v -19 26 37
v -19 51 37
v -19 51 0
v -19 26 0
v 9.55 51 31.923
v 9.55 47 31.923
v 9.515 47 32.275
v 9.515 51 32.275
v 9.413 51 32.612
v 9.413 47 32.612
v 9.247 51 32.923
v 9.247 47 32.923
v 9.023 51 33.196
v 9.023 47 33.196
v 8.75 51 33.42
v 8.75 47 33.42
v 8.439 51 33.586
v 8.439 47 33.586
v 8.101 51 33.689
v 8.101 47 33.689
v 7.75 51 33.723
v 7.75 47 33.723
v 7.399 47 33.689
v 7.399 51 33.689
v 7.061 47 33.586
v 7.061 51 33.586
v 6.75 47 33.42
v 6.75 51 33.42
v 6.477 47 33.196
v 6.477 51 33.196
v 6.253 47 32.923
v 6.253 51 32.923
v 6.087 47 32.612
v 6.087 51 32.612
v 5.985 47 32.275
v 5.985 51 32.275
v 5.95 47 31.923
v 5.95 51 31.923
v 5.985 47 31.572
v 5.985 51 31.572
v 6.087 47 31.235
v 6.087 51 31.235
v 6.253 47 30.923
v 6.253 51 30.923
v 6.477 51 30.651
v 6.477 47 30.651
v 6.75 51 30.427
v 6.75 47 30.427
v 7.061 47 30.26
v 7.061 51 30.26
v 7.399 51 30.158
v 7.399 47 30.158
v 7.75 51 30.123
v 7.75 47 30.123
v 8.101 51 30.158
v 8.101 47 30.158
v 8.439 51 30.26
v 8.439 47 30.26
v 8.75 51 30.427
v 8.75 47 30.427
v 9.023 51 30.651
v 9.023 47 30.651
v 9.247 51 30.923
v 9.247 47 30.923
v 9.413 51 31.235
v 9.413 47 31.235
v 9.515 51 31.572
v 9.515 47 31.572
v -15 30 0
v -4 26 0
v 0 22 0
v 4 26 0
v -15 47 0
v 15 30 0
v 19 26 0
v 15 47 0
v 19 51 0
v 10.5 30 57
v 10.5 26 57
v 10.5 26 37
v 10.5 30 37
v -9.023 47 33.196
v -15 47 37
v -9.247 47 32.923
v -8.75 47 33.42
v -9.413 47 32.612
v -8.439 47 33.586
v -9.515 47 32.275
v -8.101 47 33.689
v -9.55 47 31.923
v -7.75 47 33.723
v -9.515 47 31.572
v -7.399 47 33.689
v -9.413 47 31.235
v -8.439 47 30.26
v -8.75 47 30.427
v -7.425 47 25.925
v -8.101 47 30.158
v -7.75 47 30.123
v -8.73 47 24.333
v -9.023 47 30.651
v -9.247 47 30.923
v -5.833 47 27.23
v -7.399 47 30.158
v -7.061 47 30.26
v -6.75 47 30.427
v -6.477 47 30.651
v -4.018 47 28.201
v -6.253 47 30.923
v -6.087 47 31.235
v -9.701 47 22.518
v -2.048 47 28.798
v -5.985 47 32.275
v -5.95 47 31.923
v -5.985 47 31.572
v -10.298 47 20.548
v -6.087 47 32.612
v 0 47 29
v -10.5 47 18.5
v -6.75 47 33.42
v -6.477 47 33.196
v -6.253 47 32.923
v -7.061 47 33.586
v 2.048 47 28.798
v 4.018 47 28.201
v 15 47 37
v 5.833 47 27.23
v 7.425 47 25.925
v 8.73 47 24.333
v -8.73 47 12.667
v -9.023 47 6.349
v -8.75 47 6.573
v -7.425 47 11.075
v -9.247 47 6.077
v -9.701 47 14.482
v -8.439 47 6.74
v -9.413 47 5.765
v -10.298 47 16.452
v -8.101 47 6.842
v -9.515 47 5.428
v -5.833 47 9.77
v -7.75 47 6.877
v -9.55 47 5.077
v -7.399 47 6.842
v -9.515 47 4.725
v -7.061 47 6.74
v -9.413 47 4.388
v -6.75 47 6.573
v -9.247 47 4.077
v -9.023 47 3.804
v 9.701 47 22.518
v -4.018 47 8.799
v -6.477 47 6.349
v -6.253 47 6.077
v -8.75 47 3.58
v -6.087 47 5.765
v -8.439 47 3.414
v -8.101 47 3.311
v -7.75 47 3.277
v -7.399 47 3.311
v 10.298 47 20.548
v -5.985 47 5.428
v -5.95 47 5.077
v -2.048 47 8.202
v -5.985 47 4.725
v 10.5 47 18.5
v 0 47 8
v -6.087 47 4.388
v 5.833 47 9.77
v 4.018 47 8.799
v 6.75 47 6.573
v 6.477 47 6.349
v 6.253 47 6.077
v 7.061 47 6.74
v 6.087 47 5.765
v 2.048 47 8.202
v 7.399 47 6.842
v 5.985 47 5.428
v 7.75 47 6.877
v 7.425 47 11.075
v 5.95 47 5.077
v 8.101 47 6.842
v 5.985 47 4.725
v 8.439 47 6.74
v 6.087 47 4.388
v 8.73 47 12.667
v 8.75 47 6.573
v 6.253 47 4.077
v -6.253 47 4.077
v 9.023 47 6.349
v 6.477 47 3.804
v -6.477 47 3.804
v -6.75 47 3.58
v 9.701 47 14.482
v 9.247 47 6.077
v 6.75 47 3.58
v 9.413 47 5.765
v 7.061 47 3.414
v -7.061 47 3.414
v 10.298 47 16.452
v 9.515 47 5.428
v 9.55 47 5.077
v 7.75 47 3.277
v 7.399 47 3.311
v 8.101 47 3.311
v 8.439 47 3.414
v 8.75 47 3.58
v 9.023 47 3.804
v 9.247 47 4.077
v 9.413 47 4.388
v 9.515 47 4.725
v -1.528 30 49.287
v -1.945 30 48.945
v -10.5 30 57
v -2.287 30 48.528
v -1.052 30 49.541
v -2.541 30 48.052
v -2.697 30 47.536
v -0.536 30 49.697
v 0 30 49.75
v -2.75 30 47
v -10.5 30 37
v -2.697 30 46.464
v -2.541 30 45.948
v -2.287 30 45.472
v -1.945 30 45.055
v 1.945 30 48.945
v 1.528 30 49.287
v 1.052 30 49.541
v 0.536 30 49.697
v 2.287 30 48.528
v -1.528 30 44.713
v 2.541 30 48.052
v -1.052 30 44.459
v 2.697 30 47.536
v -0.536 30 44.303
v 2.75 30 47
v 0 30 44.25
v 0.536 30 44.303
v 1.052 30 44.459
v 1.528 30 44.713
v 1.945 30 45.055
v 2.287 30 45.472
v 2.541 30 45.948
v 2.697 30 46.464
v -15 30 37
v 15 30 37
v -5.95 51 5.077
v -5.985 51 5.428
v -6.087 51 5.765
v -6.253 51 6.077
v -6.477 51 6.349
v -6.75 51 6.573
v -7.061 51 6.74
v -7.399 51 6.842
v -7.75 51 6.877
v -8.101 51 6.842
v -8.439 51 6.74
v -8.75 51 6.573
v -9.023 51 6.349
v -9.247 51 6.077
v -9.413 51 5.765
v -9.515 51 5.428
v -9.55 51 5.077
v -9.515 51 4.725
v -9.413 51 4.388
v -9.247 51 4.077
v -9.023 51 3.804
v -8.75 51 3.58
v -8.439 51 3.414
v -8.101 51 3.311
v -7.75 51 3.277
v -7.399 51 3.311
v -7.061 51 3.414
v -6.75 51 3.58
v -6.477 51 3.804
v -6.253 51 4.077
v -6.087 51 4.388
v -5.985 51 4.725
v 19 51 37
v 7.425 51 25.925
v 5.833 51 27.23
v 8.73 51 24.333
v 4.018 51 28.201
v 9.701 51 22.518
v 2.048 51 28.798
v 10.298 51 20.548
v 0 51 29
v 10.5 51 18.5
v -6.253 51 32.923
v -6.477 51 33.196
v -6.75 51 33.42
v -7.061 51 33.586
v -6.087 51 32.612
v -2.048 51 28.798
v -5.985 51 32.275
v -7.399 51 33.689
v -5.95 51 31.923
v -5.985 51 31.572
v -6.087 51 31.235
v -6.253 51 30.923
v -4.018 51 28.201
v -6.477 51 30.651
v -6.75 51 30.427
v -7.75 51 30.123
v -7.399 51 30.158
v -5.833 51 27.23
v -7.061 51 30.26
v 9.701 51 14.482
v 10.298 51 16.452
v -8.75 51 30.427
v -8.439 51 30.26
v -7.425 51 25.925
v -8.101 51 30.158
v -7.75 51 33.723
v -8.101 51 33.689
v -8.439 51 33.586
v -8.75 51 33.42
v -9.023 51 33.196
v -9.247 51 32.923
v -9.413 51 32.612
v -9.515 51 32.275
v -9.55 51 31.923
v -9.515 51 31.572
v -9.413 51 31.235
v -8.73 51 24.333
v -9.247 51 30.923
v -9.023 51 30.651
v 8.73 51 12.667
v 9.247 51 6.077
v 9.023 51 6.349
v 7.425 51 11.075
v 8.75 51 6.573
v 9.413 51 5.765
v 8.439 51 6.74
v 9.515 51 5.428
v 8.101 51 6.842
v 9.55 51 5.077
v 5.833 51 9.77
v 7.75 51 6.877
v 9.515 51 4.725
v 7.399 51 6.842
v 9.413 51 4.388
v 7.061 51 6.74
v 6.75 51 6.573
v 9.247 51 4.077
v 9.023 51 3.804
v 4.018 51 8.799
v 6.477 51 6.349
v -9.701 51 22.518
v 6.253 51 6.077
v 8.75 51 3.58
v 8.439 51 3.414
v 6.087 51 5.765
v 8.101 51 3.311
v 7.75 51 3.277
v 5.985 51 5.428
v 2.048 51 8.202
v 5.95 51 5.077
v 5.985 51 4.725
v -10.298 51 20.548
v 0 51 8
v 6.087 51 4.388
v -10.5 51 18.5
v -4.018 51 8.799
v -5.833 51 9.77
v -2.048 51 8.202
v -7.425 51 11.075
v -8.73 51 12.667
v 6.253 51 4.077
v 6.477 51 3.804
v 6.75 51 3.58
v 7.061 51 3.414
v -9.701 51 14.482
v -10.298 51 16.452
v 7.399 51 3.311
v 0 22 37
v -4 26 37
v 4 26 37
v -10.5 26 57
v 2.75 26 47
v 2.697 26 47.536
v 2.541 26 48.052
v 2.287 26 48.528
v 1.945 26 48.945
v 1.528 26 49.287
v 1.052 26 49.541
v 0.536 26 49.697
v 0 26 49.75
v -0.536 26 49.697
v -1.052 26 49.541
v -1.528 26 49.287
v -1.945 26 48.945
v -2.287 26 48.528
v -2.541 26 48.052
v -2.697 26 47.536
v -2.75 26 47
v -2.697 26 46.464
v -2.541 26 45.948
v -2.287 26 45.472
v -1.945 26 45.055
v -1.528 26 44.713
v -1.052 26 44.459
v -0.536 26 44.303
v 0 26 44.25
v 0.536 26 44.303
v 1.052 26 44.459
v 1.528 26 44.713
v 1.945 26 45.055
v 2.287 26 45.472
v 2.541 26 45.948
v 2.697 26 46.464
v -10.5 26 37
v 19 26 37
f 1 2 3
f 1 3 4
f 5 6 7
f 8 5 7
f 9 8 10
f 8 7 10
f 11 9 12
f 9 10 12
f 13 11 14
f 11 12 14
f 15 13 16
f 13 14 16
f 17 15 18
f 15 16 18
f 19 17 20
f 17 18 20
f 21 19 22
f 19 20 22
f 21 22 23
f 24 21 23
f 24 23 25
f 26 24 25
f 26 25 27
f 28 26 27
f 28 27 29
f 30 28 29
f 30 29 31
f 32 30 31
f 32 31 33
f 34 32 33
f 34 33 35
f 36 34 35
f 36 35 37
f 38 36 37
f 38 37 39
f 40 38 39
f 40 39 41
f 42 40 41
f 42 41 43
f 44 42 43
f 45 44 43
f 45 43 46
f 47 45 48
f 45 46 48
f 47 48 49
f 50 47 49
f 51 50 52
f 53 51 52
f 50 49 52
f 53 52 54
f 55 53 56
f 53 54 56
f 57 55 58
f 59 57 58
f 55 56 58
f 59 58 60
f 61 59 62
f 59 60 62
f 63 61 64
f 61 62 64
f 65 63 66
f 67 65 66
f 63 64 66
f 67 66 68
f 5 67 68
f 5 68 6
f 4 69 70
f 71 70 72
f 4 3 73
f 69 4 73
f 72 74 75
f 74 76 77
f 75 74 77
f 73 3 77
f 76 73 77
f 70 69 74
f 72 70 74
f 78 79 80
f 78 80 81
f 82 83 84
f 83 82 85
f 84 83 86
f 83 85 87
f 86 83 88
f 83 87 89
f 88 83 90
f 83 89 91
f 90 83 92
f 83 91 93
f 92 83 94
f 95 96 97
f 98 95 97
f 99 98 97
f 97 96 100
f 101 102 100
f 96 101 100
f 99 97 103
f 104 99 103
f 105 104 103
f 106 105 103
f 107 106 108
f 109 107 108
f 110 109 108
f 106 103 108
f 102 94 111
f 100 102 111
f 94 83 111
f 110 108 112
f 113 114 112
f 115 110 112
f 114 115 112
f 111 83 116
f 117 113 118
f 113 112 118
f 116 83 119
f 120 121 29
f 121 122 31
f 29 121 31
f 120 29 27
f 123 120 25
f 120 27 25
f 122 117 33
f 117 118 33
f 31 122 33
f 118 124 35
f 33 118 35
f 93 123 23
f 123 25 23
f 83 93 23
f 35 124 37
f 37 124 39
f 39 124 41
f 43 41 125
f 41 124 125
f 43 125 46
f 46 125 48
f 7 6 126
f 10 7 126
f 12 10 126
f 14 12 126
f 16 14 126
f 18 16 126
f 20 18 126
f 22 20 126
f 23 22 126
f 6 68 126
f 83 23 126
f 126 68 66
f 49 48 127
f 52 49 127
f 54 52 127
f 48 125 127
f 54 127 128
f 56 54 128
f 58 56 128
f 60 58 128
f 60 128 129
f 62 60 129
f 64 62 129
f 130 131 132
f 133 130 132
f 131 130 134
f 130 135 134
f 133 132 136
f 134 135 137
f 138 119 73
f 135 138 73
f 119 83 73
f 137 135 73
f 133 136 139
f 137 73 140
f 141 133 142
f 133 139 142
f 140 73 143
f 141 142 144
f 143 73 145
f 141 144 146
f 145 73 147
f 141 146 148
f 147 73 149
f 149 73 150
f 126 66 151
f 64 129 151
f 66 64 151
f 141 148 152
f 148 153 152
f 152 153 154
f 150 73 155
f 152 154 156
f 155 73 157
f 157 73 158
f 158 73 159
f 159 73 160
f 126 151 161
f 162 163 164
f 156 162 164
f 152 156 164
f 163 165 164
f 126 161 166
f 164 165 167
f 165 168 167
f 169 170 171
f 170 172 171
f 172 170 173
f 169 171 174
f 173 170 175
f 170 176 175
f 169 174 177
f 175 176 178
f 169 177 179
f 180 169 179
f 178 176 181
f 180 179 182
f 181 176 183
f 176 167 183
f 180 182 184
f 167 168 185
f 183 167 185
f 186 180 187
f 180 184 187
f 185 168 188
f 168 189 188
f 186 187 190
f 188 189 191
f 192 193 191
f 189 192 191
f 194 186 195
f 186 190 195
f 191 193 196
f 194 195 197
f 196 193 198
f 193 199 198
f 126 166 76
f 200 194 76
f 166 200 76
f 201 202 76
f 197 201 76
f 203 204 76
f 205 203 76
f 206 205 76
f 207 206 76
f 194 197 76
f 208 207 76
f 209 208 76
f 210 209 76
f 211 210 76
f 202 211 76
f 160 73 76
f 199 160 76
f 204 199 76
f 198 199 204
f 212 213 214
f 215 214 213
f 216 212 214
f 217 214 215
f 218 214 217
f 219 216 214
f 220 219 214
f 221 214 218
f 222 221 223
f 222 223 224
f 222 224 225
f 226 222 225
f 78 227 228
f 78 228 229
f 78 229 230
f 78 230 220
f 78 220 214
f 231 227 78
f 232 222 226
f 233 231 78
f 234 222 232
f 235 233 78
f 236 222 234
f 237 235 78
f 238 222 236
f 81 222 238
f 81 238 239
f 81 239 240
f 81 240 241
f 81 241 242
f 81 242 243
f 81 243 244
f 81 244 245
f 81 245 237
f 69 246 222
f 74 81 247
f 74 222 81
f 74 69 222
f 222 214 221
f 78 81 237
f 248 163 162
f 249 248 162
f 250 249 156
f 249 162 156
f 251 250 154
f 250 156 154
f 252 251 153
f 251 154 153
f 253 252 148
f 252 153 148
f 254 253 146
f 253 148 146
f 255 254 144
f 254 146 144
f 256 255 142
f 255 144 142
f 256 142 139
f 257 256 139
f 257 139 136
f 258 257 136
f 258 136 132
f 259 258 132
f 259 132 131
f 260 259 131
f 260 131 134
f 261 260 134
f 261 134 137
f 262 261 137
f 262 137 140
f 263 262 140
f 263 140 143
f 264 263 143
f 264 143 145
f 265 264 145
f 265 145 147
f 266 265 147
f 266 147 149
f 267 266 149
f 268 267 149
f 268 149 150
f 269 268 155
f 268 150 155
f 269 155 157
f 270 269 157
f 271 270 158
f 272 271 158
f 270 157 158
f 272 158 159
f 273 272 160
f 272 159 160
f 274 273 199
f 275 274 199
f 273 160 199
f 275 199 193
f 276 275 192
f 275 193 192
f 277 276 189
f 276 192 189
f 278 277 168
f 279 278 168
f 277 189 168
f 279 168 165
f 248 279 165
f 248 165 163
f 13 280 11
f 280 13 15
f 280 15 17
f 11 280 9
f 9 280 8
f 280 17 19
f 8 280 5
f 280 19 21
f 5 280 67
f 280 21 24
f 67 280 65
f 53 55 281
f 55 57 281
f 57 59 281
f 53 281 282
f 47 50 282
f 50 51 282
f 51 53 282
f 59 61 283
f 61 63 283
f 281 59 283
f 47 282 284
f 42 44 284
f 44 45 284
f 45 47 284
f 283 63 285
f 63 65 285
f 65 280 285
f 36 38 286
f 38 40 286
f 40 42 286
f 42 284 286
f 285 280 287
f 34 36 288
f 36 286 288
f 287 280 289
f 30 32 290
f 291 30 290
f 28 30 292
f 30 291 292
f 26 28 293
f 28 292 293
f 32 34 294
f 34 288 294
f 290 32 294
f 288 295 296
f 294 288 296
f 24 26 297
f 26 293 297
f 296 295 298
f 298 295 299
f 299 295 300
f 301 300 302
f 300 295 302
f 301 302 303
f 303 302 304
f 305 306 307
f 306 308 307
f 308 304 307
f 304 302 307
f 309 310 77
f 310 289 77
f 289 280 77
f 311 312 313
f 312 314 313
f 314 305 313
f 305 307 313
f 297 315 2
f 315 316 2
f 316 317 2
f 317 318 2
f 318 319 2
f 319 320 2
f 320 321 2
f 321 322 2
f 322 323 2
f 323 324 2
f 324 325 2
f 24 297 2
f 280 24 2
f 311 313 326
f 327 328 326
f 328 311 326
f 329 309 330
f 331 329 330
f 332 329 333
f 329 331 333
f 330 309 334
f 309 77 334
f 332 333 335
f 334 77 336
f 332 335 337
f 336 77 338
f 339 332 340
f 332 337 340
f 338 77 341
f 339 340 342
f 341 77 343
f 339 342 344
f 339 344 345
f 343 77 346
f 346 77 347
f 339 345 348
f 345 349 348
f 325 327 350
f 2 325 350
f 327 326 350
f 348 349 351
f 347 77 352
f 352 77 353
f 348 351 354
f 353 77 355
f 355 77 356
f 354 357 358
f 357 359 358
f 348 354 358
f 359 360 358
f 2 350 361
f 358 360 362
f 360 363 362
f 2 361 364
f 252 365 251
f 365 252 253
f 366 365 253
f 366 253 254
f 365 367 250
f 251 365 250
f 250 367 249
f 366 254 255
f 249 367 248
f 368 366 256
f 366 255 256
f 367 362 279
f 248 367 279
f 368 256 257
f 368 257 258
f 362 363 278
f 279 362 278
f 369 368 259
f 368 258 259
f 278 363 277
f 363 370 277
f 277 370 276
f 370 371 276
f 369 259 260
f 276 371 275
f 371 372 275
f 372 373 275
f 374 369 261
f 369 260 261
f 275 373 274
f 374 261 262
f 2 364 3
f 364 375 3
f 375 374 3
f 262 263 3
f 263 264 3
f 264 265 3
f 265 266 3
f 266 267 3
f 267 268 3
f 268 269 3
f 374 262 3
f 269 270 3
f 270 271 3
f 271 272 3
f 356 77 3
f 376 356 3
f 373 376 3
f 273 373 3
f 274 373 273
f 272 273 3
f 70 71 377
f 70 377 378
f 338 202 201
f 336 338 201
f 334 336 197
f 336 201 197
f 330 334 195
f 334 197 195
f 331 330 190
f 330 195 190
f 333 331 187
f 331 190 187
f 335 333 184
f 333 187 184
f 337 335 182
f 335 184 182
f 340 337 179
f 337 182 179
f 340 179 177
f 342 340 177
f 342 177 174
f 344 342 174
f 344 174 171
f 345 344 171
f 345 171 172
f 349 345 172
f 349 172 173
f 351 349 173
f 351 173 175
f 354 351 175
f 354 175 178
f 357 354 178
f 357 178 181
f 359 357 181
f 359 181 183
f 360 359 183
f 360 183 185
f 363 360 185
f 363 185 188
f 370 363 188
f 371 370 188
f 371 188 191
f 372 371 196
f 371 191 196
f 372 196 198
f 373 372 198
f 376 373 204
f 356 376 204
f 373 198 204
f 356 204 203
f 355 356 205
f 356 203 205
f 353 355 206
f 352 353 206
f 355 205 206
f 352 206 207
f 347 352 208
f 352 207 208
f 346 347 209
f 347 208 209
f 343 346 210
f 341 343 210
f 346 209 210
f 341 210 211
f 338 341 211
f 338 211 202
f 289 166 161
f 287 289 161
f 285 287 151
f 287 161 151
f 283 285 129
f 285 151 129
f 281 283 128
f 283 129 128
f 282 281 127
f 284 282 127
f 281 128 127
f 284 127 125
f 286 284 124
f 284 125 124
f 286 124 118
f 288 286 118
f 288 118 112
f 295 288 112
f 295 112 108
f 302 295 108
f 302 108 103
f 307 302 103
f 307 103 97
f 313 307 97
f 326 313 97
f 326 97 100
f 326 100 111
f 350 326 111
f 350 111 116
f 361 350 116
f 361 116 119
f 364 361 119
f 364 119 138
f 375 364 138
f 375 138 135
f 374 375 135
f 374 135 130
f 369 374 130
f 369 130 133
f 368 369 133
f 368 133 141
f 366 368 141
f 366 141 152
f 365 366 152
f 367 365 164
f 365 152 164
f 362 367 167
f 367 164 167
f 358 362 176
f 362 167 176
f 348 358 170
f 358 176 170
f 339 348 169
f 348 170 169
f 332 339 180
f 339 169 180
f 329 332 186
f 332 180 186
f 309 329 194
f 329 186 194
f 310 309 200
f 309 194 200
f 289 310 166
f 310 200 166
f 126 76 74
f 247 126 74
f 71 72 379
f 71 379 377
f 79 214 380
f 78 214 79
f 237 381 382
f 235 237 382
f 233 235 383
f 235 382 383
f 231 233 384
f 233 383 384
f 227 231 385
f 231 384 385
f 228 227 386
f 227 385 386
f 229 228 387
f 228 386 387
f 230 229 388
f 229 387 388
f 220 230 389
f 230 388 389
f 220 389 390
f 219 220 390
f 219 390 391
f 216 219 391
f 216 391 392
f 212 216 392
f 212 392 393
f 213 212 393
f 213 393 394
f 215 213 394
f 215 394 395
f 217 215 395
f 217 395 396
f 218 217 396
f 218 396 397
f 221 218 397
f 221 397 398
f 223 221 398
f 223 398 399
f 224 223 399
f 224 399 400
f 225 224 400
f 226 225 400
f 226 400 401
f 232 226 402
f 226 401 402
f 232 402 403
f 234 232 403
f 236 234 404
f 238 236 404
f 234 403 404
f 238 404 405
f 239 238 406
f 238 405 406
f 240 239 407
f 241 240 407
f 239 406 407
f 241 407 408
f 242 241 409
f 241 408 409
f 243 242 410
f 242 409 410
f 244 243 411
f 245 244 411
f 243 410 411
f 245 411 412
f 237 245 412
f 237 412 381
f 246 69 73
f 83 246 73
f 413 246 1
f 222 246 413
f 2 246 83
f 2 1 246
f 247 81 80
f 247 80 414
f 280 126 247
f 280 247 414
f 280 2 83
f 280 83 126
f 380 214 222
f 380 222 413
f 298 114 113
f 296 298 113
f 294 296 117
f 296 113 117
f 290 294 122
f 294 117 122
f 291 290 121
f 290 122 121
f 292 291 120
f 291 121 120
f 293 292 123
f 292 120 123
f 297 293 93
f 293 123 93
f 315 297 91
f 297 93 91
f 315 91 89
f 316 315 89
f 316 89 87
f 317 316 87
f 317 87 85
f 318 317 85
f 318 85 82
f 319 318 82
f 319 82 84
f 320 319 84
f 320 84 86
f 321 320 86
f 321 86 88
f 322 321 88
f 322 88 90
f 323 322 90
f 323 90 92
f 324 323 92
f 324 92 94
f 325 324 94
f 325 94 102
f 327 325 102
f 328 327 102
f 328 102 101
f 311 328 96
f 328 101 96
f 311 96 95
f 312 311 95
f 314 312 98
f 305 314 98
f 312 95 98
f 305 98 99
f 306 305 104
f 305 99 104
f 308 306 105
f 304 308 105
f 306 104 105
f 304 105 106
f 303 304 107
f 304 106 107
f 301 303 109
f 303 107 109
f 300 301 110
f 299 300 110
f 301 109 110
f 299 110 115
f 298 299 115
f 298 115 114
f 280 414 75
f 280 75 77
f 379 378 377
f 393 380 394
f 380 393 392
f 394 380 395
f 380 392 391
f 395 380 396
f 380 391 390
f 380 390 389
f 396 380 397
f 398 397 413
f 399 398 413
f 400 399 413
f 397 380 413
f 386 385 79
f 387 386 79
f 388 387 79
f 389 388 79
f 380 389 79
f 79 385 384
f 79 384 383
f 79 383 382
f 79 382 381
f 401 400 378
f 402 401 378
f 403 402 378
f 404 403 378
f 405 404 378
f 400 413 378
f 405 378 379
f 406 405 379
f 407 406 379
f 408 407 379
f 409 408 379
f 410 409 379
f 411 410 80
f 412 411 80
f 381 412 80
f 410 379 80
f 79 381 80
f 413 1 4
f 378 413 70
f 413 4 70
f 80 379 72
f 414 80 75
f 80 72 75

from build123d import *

# Parameters (mm, degrees)
F1_DEPTH  = 37
F3_DEPTH  = 37.001
F5_DEPTH  = 37
F7_D      = 3.6
F7_DEPTH  = 10
F7_TIP    = 1.0815491142
F8_D      = 21
F8_DEPTH  = 10
F8_TIP    = 6.3090364998
F9_W      = 11
F9_H      = 5
F10_DEPTH = 37.001
F11_W     = 21
F11_H     = 2
F12_DEPTH = 20
F14_D     = 5.5
F14_DEPTH = 12
F14_TIP   = 1.6523667023


# Not quite as in the source:
# - a feature names something its author has since deleted; it is built from what else it names


with BuildPart() as f1:
    # F0 (on Top) → F1 (new body)
    with BuildSketch(Plane.XY):
        Polygon((-13.5, 27), (-13.5, 0), (-5, 0), (5, 0), (13.5, 0), (13.5, 27), align=None)
    extrude(amount=F1_DEPTH)

    # F2 (on face) → F3 (cut, through all)
    with BuildSketch(Plane.XY.offset(37)):
        Polygon((0, 15.5), (0, 22), (-4, 26), (-10.5, 26), (-10.5, 19.5), (-6.5, 15.5), align=None)
        Polygon((4, 26), (0, 22), (0, 15.5), (6.5, 15.5), (10.5, 19.5), (10.5, 26), align=None)
        Polygon((6.5, 15.5), (0, 15.5), (0, 9), (4, 5), (10.5, 5), (10.5, 11.5), align=None)
        Polygon((0, 9), (0, 15.5), (-6.5, 15.5), (-10.5, 11.5), (-10.5, 5), (-4, 5), align=None)
        Polygon((0, 5), (0, 9), (-4, 5), align=None)
        Polygon((4, 5), (0, 9), (0, 5), align=None)
    extrude(amount=-F3_DEPTH, mode=Mode.SUBTRACT)

    # F4 (on Top) → F5 (join, through all)
    with BuildSketch(Plane.XY):
        Polygon((-13.5, 27), (0, 27), (13.5, 27), (13.5, 0), (19, 0), (19, 51), (-19, 51), (-19, 0), (-13.5, 0), align=None)
        Polygon((15, 30), (0, 30), (-15, 30), (-15, 47), (15, 47), align=None, mode=Mode.SUBTRACT)
    extrude(amount=F5_DEPTH)

    # F7
    with Locations(Plane(origin=(0, 51, 0), x_dir=(-1, 0, 0), z_dir=(0, 1, 0))):
        with Locations((-7.75, 5.0766062413), (7.75, 5.0766062413), (7.75, 31.9233937587), (-7.75, 31.9233937587)):
            Hole(F7_D / 2, depth=F7_DEPTH)
            with Locations((0, 0, -(F7_DEPTH + F7_TIP / 2))):  # 118° drill point
                Cone(0, F7_D / 2, F7_TIP, mode=Mode.SUBTRACT)

    # F8
    with Locations(Plane(origin=(0, 51, 0), x_dir=(-1, 0, 0), z_dir=(0, 1, 0))):
        with Locations((0, 18.5)):
            Hole(F8_D / 2, depth=F8_DEPTH)
            with Locations((0, 0, -(F8_DEPTH + F8_TIP / 2))):  # 118° drill point
                Cone(0, F8_D / 2, F8_TIP, mode=Mode.SUBTRACT)

    # F9 (on face) → F10 (cut, through all)
    with BuildSketch(Plane.XY.offset(37)):
        Polygon((-19, 26), (-19, 0), (-5.5, 0), (-5.5, 5), (-10.5, 5), (-10.5, 11.5), (-6.5, 15.5), (-10.5, 19.5), (-10.5, 26), align=None)
        Polygon((5.5, 5), (5.5, 0), (19, 0), (19, 26), (10.5, 26), (10.5, 19.5), (6.5, 15.5), (10.5, 11.5), (10.5, 5), align=None)
        with Locations((0, 2.5)):
            Rectangle(F9_W, F9_H)
    extrude(amount=-F10_DEPTH, mode=Mode.SUBTRACT)

    # F11 (on face) → F12 (join)
    with BuildSketch(Plane.XY.offset(37)):
        with Locations((0, 27)):
            Rectangle(F11_W, F11_H)
        with Locations((0, 29)):
            Rectangle(F11_W, F11_H)
        Polygon((4, 26), (10.5, 26), (10.5, 28), (-10.5, 28), (-10.5, 26), (-4, 26), align=None)
    extrude(amount=F12_DEPTH)

    # F14
    with Locations(Plane(origin=(0, 30, 0), x_dir=(-1, 0, 0), z_dir=(0, 1, 0))):
        with Locations((0, 47)):
            Hole(F14_D / 2, depth=F14_DEPTH)
            with Locations((0, 0, -(F14_DEPTH + F14_TIP / 2))):  # 118° drill point
                Cone(0, F14_D / 2, F14_TIP, mode=Mode.SUBTRACT)


solid = f1.part
